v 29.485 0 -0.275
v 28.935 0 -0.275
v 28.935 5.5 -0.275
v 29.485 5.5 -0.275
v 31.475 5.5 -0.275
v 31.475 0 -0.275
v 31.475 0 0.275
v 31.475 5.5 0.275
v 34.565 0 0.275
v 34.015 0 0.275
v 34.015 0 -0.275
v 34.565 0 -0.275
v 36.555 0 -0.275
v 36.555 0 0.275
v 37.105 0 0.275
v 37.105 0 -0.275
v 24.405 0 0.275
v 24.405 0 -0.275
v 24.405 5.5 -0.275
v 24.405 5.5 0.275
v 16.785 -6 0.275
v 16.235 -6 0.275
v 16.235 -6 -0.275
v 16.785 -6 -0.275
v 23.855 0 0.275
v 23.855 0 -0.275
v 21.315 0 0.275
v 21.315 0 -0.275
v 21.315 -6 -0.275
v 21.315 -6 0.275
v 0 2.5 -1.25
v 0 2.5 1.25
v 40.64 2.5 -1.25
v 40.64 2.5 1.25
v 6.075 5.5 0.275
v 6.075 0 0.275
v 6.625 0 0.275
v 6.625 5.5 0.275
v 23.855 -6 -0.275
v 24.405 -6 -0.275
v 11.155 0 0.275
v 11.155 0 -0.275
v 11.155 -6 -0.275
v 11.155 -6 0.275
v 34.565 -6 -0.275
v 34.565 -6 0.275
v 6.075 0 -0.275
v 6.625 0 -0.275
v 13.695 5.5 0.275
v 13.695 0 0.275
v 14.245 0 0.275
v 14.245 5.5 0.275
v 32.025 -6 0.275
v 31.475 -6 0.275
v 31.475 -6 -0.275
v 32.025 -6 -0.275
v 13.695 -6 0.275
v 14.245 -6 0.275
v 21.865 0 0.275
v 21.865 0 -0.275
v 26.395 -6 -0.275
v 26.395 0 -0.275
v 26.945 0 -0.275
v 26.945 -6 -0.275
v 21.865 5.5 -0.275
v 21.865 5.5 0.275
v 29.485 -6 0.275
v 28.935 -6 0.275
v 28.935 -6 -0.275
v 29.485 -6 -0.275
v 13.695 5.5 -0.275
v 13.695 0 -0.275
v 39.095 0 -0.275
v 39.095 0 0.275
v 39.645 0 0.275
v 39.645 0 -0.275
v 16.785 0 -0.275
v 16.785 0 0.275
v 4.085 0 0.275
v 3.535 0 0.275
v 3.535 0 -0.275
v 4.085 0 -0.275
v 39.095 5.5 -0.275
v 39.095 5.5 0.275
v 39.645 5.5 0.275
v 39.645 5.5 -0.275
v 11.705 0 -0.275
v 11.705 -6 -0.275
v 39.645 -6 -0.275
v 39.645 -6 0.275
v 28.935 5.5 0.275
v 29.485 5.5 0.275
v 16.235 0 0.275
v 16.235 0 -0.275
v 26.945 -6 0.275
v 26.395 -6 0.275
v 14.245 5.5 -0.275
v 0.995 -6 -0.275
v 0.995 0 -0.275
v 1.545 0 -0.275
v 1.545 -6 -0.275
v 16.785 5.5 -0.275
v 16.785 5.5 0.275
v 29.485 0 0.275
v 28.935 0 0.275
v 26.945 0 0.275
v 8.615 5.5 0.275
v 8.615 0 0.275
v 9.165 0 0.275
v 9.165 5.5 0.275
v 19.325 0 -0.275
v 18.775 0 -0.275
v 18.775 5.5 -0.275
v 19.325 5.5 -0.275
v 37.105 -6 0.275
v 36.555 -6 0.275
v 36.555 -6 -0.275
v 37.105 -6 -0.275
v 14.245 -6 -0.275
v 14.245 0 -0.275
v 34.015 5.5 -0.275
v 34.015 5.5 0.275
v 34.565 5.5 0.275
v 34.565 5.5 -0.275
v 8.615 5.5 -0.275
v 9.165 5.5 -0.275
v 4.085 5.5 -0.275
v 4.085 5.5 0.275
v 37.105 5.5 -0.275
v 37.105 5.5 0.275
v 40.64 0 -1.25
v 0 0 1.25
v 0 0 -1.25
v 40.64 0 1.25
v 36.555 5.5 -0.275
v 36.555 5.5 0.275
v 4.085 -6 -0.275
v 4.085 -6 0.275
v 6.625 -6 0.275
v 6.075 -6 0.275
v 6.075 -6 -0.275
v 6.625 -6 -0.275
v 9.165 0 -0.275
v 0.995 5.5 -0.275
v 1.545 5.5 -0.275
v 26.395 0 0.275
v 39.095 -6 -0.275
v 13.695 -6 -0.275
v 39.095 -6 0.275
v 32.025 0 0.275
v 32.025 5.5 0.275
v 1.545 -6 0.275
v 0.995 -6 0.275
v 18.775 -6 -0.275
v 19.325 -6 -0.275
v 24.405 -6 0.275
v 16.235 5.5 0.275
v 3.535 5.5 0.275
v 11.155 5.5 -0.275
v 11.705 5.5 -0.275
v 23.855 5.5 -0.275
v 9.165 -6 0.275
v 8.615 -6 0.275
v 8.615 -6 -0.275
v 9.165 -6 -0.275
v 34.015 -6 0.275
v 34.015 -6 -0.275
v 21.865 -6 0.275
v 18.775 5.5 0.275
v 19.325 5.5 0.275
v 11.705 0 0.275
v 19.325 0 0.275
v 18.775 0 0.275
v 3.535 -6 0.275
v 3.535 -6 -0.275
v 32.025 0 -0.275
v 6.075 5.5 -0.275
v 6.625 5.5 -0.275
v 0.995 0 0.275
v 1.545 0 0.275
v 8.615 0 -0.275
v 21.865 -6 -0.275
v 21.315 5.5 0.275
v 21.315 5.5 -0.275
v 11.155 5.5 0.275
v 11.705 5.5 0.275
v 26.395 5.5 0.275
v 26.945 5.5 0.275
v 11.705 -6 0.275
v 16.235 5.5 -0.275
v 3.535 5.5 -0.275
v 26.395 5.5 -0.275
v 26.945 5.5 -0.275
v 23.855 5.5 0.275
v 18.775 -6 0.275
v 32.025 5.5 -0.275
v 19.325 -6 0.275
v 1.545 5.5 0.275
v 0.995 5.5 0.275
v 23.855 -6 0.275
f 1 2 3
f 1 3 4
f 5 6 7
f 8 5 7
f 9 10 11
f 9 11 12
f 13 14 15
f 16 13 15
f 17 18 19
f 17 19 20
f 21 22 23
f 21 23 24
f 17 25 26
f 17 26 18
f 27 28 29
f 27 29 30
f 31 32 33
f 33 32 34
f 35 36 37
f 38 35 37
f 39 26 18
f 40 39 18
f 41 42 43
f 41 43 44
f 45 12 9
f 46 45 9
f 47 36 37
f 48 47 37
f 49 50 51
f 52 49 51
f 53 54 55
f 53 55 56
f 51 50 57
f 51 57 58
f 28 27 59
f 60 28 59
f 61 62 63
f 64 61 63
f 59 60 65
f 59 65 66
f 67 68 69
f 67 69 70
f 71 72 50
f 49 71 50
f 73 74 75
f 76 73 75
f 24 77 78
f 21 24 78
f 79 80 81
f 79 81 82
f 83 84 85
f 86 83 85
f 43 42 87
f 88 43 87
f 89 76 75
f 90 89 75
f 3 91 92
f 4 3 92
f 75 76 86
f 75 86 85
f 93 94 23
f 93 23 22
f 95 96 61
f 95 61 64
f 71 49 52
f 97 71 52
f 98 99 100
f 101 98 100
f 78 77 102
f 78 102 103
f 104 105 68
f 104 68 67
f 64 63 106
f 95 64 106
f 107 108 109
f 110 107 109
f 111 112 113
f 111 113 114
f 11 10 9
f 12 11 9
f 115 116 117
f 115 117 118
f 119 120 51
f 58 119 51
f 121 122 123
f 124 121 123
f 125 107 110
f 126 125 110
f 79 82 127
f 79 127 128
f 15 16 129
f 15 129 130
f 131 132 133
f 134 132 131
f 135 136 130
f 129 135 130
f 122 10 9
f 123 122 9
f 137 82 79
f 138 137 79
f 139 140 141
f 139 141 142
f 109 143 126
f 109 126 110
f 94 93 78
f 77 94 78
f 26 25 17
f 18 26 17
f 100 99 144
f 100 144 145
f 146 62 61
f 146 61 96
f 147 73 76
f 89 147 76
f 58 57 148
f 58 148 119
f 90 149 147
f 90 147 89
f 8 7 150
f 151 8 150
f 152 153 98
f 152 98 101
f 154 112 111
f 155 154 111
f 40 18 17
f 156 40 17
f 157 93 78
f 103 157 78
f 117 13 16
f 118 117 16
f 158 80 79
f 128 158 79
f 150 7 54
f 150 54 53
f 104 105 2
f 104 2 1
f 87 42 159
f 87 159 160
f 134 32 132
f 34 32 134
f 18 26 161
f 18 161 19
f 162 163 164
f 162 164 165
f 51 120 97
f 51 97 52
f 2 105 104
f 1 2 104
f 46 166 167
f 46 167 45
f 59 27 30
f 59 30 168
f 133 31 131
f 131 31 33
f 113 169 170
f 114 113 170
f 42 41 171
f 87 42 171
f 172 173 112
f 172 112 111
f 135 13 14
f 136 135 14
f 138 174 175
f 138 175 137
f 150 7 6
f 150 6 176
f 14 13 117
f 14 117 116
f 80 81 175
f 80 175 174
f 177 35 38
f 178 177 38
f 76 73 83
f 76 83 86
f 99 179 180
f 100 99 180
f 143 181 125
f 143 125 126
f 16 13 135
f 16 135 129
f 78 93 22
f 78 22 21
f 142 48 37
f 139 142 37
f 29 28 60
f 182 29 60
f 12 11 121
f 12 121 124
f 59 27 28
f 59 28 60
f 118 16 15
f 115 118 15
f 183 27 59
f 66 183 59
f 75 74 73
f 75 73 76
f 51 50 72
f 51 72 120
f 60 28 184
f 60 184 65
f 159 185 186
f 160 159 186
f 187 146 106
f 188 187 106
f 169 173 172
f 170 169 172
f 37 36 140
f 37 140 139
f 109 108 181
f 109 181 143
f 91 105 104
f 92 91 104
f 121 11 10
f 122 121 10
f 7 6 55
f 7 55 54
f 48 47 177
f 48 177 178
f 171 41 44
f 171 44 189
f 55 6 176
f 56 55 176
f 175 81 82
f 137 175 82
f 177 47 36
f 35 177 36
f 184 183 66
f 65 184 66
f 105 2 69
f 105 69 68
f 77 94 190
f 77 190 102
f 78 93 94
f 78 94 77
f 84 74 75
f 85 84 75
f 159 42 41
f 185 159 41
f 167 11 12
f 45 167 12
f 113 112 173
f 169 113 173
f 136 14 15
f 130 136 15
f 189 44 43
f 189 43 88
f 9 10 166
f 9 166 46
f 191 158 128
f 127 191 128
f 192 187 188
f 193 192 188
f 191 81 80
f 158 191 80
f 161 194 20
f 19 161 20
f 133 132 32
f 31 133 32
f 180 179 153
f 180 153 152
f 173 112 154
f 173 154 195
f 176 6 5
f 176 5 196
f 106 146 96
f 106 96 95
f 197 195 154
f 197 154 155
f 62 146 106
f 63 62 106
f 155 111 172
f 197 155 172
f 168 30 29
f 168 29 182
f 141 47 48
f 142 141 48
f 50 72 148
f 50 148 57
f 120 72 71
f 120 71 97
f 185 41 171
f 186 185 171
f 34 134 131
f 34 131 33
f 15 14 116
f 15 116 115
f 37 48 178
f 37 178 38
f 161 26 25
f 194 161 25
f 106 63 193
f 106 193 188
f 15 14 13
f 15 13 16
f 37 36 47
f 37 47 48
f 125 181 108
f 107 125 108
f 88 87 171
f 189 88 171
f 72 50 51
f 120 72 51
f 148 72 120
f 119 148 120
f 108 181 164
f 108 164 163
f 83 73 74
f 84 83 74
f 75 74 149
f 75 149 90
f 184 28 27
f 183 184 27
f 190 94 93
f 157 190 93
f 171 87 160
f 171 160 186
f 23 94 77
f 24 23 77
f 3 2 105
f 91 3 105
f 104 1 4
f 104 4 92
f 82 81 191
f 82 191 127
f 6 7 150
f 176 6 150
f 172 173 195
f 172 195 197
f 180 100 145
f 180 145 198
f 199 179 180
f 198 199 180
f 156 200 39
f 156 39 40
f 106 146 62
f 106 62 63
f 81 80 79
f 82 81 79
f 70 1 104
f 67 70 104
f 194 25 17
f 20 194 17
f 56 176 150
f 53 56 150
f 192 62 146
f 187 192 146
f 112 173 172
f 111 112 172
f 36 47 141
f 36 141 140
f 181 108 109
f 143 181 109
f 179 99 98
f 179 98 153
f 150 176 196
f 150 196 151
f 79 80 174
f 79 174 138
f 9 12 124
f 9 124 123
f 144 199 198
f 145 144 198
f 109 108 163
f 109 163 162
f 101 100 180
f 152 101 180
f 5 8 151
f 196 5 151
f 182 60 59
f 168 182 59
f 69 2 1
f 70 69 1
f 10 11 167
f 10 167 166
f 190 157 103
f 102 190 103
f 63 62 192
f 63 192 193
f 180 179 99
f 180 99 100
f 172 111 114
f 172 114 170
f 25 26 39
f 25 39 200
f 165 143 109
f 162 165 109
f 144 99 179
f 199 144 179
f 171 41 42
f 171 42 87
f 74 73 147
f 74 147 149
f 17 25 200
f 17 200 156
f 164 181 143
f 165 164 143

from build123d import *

# Parameters (mm, degrees)
SKETCH1_W              = 40.64
SKETCH1_H              = 2.5
BOSS_EXTRUDE1_DEPTH    = 1.25
SKETCH2_W              = 0.55
SKETCH2_H              = 0.55
BOSS_EXTRUDE2_DEPTH    = 6
BOSS_EXTRUDE2_2_DEPTH  = 6
BOSS_EXTRUDE2_3_DEPTH  = 6
BOSS_EXTRUDE2_4_DEPTH  = 6
BOSS_EXTRUDE2_5_DEPTH  = 6
BOSS_EXTRUDE2_6_DEPTH  = 6
BOSS_EXTRUDE2_7_DEPTH  = 6
BOSS_EXTRUDE2_8_DEPTH  = 6
BOSS_EXTRUDE2_9_DEPTH  = 6
BOSS_EXTRUDE2_10_DEPTH = 6
BOSS_EXTRUDE2_11_DEPTH = 6
BOSS_EXTRUDE2_12_DEPTH = 6
BOSS_EXTRUDE2_13_DEPTH = 6
BOSS_EXTRUDE2_14_DEPTH = 6
BOSS_EXTRUDE2_15_DEPTH = 6
BOSS_EXTRUDE2_16_DEPTH = 6
SKETCH2_2_W            = 0.55
SKETCH2_2_H            = 0.55
BOSS_EXTRUDE3_DEPTH    = 5.5
BOSS_EXTRUDE3_2_DEPTH  = 5.5
BOSS_EXTRUDE3_3_DEPTH  = 5.5
BOSS_EXTRUDE3_4_DEPTH  = 5.5
BOSS_EXTRUDE3_5_DEPTH  = 5.5
BOSS_EXTRUDE3_6_DEPTH  = 5.5
BOSS_EXTRUDE3_7_DEPTH  = 5.5
BOSS_EXTRUDE3_8_DEPTH  = 5.5
BOSS_EXTRUDE3_9_DEPTH  = 5.5
BOSS_EXTRUDE3_10_DEPTH = 5.5
BOSS_EXTRUDE3_11_DEPTH = 5.5
BOSS_EXTRUDE3_12_DEPTH = 5.5
BOSS_EXTRUDE3_13_DEPTH = 5.5
BOSS_EXTRUDE3_14_DEPTH = 5.5
BOSS_EXTRUDE3_15_DEPTH = 5.5
BOSS_EXTRUDE3_16_DEPTH = 5.5


with BuildPart() as part:
    # Sketch1 → Boss-Extrude1 (new body, symmetric)
    with BuildSketch(Plane.XY):
        with Locations((20.32, 1.25)):
            Rectangle(SKETCH1_W, SKETCH1_H)
    extrude(amount=BOSS_EXTRUDE1_DEPTH, both=True)


with BuildPart() as body_2:
    # Sketch2 → Boss-Extrude2 (new body)
    with BuildSketch(Plane.XZ):
        with Locations((3.81, 0)):
            Rectangle(SKETCH2_W, SKETCH2_H)
    extrude(amount=BOSS_EXTRUDE2_DEPTH)


with BuildPart() as body_3:
    # Sketch2 → Boss-Extrude2 2 (new body)
    with BuildSketch(Plane.XZ):
        with Locations((1.27, 0)):
            Rectangle(SKETCH2_W, SKETCH2_H)
    extrude(amount=BOSS_EXTRUDE2_2_DEPTH)


with BuildPart() as body_4:
    # Sketch2 → Boss-Extrude2 3 (new body)
    with BuildSketch(Plane.XZ):
        with Locations((6.35, 0)):
            Rectangle(SKETCH2_W, SKETCH2_H)
    extrude(amount=BOSS_EXTRUDE2_3_DEPTH)


with BuildPart() as body_5:
    # Sketch2 → Boss-Extrude2 4 (new body)
    with BuildSketch(Plane.XZ):
        with Locations((8.89, 0)):
            Rectangle(SKETCH2_W, SKETCH2_H)
    extrude(amount=BOSS_EXTRUDE2_4_DEPTH)


with BuildPart() as body_6:
    # Sketch2 → Boss-Extrude2 5 (new body)
    with BuildSketch(Plane.XZ):
        with Locations((11.43, 0)):
            Rectangle(SKETCH2_W, SKETCH2_H)
    extrude(amount=BOSS_EXTRUDE2_5_DEPTH)


with BuildPart() as body_7:
    # Sketch2 → Boss-Extrude2 6 (new body)
    with BuildSketch(Plane.XZ):
        with Locations((13.97, 0)):
            Rectangle(SKETCH2_W, SKETCH2_H)
    extrude(amount=BOSS_EXTRUDE2_6_DEPTH)


with BuildPart() as body_8:
    # Sketch2 → Boss-Extrude2 7 (new body)
    with BuildSketch(Plane.XZ):
        with Locations((16.51, 0)):
            Rectangle(SKETCH2_W, SKETCH2_H)
    extrude(amount=BOSS_EXTRUDE2_7_DEPTH)


with BuildPart() as body_9:
    # Sketch2 → Boss-Extrude2 8 (new body)
    with BuildSketch(Plane.XZ):
        with Locations((19.05, 0)):
            Rectangle(SKETCH2_W, SKETCH2_H)
    extrude(amount=BOSS_EXTRUDE2_8_DEPTH)


with BuildPart() as body_10:
    # Sketch2 → Boss-Extrude2 9 (new body)
    with BuildSketch(Plane.XZ):
        with Locations((21.59, 0)):
            Rectangle(SKETCH2_W, SKETCH2_H)
    extrude(amount=BOSS_EXTRUDE2_9_DEPTH)


with BuildPart() as body_11:
    # Sketch2 → Boss-Extrude2 10 (new body)
    with BuildSketch(Plane.XZ):
        with Locations((24.13, 0)):
            Rectangle(SKETCH2_W, SKETCH2_H)
    extrude(amount=BOSS_EXTRUDE2_10_DEPTH)


with BuildPart() as body_12:
    # Sketch2 → Boss-Extrude2 11 (new body)
    with BuildSketch(Plane.XZ):
        with Locations((26.67, 0)):
            Rectangle(SKETCH2_W, SKETCH2_H)
    extrude(amount=BOSS_EXTRUDE2_11_DEPTH)


with BuildPart() as body_13:
    # Sketch2 → Boss-Extrude2 12 (new body)
    with BuildSketch(Plane.XZ):
        with Locations((29.21, 0)):
            Rectangle(SKETCH2_W, SKETCH2_H)
    extrude(amount=BOSS_EXTRUDE2_12_DEPTH)


with BuildPart() as body_14:
    # Sketch2 → Boss-Extrude2 13 (new body)
    with BuildSketch(Plane.XZ):
        with Locations((31.75, 0)):
            Rectangle(SKETCH2_W, SKETCH2_H)
    extrude(amount=BOSS_EXTRUDE2_13_DEPTH)


with BuildPart() as body_15:
    # Sketch2 → Boss-Extrude2 14 (new body)
    with BuildSketch(Plane.XZ):
        with Locations((34.29, 0)):
            Rectangle(SKETCH2_W, SKETCH2_H)
    extrude(amount=BOSS_EXTRUDE2_14_DEPTH)


with BuildPart() as body_16:
    # Sketch2 → Boss-Extrude2 15 (new body)
    with BuildSketch(Plane.XZ):
        with Locations((36.83, 0)):
            Rectangle(SKETCH2_W, SKETCH2_H)
    extrude(amount=BOSS_EXTRUDE2_15_DEPTH)


with BuildPart() as body_17:
    # Sketch2 → Boss-Extrude2 16 (new body)
    with BuildSketch(Plane.XZ):
        with Locations((39.37, 0)):
            Rectangle(SKETCH2_W, SKETCH2_H)
    extrude(amount=BOSS_EXTRUDE2_16_DEPTH)


with BuildPart() as body_18:
    # Sketch2<2> → Boss-Extrude3 (new body)
    with BuildSketch(Plane.XZ):
        with Locations((3.81, 0)):
            Rectangle(SKETCH2_2_W, SKETCH2_2_H)
    extrude(amount=-BOSS_EXTRUDE3_DEPTH)


with BuildPart() as body_19:
    # Sketch2<2> → Boss-Extrude3 2 (new body)
    with BuildSketch(Plane.XZ):
        with Locations((1.27, 0)):
            Rectangle(SKETCH2_2_W, SKETCH2_2_H)
    extrude(amount=-BOSS_EXTRUDE3_2_DEPTH)


with BuildPart() as body_20:
    # Sketch2<2> → Boss-Extrude3 3 (new body)
    with BuildSketch(Plane.XZ):
        with Locations((6.35, 0)):
            Rectangle(SKETCH2_2_W, SKETCH2_2_H)
    extrude(amount=-BOSS_EXTRUDE3_3_DEPTH)


with BuildPart() as body_21:
    # Sketch2<2> → Boss-Extrude3 4 (new body)
    with BuildSketch(Plane.XZ):
        with Locations((8.89, 0)):
            Rectangle(SKETCH2_2_W, SKETCH2_2_H)
    extrude(amount=-BOSS_EXTRUDE3_4_DEPTH)


with BuildPart() as body_22:
    # Sketch2<2> → Boss-Extrude3 5 (new body)
    with BuildSketch(Plane.XZ):
        with Locations((11.43, 0)):
            Rectangle(SKETCH2_2_W, SKETCH2_2_H)
    extrude(amount=-BOSS_EXTRUDE3_5_DEPTH)


with BuildPart() as body_23:
    # Sketch2<2> → Boss-Extrude3 6 (new body)
    with BuildSketch(Plane.XZ):
        with Locations((13.97, 0)):
            Rectangle(SKETCH2_2_W, SKETCH2_2_H)
    extrude(amount=-BOSS_EXTRUDE3_6_DEPTH)


with BuildPart() as body_24:
    # Sketch2<2> → Boss-Extrude3 7 (new body)
    with BuildSketch(Plane.XZ):
        with Locations((16.51, 0)):
            Rectangle(SKETCH2_2_W, SKETCH2_2_H)
    extrude(amount=-BOSS_EXTRUDE3_7_DEPTH)


with BuildPart() as body_25:
    # Sketch2<2> → Boss-Extrude3 8 (new body)
    with BuildSketch(Plane.XZ):
        with Locations((19.05, 0)):
            Rectangle(SKETCH2_2_W, SKETCH2_2_H)
    extrude(amount=-BOSS_EXTRUDE3_8_DEPTH)


with BuildPart() as body_26:
    # Sketch2<2> → Boss-Extrude3 9 (new body)
    with BuildSketch(Plane.XZ):
        with Locations((21.59, 0)):
            Rectangle(SKETCH2_2_W, SKETCH2_2_H)
    extrude(amount=-BOSS_EXTRUDE3_9_DEPTH)


with BuildPart() as body_27:
    # Sketch2<2> → Boss-Extrude3 10 (new body)
    with BuildSketch(Plane.XZ):
        with Locations((24.13, 0)):
            Rectangle(SKETCH2_2_W, SKETCH2_2_H)
    extrude(amount=-BOSS_EXTRUDE3_10_DEPTH)


with BuildPart() as body_28:
    # Sketch2<2> → Boss-Extrude3 11 (new body)
    with BuildSketch(Plane.XZ):
        with Locations((26.67, 0)):
            Rectangle(SKETCH2_2_W, SKETCH2_2_H)
    extrude(amount=-BOSS_EXTRUDE3_11_DEPTH)


with BuildPart() as body_29:
    # Sketch2<2> → Boss-Extrude3 12 (new body)
    with BuildSketch(Plane.XZ):
        with Locations((29.21, 0)):
            Rectangle(SKETCH2_2_W, SKETCH2_2_H)
    extrude(amount=-BOSS_EXTRUDE3_12_DEPTH)


with BuildPart() as body_30:
    # Sketch2<2> → Boss-Extrude3 13 (new body)
    with BuildSketch(Plane.XZ):
        with Locations((31.75, 0)):
            Rectangle(SKETCH2_2_W, SKETCH2_2_H)
    extrude(amount=-BOSS_EXTRUDE3_13_DEPTH)


with BuildPart() as body_31:
    # Sketch2<2> → Boss-Extrude3 14 (new body)
    with BuildSketch(Plane.XZ):
        with Locations((34.29, 0)):
            Rectangle(SKETCH2_2_W, SKETCH2_2_H)
    extrude(amount=-BOSS_EXTRUDE3_14_DEPTH)


with BuildPart() as body_32:
    # Sketch2<2> → Boss-Extrude3 15 (new body)
    with BuildSketch(Plane.XZ):
        with Locations((36.83, 0)):
            Rectangle(SKETCH2_2_W, SKETCH2_2_H)
    extrude(amount=-BOSS_EXTRUDE3_15_DEPTH)


with BuildPart() as body_33:
    # Sketch2<2> → Boss-Extrude3 16 (new body)
    with BuildSketch(Plane.XZ):
        with Locations((39.37, 0)):
            Rectangle(SKETCH2_2_W, SKETCH2_2_H)
    extrude(amount=-BOSS_EXTRUDE3_16_DEPTH)


solid = Compound([part.part, body_2.part, body_3.part, body_4.part, body_5.part, body_6.part, body_7.part, body_8.part, body_9.part, body_10.part, body_11.part, body_12.part, body_13.part, body_14.part, body_15.part, body_16.part, body_17.part, body_18.part, body_19.part, body_20.part, body_21.part, body_22.part, body_23.part, body_24.part, body_25.part, body_26.part, body_27.part, body_28.part, body_29.part, body_30.part, body_31.part, body_32.part, body_33.part])
